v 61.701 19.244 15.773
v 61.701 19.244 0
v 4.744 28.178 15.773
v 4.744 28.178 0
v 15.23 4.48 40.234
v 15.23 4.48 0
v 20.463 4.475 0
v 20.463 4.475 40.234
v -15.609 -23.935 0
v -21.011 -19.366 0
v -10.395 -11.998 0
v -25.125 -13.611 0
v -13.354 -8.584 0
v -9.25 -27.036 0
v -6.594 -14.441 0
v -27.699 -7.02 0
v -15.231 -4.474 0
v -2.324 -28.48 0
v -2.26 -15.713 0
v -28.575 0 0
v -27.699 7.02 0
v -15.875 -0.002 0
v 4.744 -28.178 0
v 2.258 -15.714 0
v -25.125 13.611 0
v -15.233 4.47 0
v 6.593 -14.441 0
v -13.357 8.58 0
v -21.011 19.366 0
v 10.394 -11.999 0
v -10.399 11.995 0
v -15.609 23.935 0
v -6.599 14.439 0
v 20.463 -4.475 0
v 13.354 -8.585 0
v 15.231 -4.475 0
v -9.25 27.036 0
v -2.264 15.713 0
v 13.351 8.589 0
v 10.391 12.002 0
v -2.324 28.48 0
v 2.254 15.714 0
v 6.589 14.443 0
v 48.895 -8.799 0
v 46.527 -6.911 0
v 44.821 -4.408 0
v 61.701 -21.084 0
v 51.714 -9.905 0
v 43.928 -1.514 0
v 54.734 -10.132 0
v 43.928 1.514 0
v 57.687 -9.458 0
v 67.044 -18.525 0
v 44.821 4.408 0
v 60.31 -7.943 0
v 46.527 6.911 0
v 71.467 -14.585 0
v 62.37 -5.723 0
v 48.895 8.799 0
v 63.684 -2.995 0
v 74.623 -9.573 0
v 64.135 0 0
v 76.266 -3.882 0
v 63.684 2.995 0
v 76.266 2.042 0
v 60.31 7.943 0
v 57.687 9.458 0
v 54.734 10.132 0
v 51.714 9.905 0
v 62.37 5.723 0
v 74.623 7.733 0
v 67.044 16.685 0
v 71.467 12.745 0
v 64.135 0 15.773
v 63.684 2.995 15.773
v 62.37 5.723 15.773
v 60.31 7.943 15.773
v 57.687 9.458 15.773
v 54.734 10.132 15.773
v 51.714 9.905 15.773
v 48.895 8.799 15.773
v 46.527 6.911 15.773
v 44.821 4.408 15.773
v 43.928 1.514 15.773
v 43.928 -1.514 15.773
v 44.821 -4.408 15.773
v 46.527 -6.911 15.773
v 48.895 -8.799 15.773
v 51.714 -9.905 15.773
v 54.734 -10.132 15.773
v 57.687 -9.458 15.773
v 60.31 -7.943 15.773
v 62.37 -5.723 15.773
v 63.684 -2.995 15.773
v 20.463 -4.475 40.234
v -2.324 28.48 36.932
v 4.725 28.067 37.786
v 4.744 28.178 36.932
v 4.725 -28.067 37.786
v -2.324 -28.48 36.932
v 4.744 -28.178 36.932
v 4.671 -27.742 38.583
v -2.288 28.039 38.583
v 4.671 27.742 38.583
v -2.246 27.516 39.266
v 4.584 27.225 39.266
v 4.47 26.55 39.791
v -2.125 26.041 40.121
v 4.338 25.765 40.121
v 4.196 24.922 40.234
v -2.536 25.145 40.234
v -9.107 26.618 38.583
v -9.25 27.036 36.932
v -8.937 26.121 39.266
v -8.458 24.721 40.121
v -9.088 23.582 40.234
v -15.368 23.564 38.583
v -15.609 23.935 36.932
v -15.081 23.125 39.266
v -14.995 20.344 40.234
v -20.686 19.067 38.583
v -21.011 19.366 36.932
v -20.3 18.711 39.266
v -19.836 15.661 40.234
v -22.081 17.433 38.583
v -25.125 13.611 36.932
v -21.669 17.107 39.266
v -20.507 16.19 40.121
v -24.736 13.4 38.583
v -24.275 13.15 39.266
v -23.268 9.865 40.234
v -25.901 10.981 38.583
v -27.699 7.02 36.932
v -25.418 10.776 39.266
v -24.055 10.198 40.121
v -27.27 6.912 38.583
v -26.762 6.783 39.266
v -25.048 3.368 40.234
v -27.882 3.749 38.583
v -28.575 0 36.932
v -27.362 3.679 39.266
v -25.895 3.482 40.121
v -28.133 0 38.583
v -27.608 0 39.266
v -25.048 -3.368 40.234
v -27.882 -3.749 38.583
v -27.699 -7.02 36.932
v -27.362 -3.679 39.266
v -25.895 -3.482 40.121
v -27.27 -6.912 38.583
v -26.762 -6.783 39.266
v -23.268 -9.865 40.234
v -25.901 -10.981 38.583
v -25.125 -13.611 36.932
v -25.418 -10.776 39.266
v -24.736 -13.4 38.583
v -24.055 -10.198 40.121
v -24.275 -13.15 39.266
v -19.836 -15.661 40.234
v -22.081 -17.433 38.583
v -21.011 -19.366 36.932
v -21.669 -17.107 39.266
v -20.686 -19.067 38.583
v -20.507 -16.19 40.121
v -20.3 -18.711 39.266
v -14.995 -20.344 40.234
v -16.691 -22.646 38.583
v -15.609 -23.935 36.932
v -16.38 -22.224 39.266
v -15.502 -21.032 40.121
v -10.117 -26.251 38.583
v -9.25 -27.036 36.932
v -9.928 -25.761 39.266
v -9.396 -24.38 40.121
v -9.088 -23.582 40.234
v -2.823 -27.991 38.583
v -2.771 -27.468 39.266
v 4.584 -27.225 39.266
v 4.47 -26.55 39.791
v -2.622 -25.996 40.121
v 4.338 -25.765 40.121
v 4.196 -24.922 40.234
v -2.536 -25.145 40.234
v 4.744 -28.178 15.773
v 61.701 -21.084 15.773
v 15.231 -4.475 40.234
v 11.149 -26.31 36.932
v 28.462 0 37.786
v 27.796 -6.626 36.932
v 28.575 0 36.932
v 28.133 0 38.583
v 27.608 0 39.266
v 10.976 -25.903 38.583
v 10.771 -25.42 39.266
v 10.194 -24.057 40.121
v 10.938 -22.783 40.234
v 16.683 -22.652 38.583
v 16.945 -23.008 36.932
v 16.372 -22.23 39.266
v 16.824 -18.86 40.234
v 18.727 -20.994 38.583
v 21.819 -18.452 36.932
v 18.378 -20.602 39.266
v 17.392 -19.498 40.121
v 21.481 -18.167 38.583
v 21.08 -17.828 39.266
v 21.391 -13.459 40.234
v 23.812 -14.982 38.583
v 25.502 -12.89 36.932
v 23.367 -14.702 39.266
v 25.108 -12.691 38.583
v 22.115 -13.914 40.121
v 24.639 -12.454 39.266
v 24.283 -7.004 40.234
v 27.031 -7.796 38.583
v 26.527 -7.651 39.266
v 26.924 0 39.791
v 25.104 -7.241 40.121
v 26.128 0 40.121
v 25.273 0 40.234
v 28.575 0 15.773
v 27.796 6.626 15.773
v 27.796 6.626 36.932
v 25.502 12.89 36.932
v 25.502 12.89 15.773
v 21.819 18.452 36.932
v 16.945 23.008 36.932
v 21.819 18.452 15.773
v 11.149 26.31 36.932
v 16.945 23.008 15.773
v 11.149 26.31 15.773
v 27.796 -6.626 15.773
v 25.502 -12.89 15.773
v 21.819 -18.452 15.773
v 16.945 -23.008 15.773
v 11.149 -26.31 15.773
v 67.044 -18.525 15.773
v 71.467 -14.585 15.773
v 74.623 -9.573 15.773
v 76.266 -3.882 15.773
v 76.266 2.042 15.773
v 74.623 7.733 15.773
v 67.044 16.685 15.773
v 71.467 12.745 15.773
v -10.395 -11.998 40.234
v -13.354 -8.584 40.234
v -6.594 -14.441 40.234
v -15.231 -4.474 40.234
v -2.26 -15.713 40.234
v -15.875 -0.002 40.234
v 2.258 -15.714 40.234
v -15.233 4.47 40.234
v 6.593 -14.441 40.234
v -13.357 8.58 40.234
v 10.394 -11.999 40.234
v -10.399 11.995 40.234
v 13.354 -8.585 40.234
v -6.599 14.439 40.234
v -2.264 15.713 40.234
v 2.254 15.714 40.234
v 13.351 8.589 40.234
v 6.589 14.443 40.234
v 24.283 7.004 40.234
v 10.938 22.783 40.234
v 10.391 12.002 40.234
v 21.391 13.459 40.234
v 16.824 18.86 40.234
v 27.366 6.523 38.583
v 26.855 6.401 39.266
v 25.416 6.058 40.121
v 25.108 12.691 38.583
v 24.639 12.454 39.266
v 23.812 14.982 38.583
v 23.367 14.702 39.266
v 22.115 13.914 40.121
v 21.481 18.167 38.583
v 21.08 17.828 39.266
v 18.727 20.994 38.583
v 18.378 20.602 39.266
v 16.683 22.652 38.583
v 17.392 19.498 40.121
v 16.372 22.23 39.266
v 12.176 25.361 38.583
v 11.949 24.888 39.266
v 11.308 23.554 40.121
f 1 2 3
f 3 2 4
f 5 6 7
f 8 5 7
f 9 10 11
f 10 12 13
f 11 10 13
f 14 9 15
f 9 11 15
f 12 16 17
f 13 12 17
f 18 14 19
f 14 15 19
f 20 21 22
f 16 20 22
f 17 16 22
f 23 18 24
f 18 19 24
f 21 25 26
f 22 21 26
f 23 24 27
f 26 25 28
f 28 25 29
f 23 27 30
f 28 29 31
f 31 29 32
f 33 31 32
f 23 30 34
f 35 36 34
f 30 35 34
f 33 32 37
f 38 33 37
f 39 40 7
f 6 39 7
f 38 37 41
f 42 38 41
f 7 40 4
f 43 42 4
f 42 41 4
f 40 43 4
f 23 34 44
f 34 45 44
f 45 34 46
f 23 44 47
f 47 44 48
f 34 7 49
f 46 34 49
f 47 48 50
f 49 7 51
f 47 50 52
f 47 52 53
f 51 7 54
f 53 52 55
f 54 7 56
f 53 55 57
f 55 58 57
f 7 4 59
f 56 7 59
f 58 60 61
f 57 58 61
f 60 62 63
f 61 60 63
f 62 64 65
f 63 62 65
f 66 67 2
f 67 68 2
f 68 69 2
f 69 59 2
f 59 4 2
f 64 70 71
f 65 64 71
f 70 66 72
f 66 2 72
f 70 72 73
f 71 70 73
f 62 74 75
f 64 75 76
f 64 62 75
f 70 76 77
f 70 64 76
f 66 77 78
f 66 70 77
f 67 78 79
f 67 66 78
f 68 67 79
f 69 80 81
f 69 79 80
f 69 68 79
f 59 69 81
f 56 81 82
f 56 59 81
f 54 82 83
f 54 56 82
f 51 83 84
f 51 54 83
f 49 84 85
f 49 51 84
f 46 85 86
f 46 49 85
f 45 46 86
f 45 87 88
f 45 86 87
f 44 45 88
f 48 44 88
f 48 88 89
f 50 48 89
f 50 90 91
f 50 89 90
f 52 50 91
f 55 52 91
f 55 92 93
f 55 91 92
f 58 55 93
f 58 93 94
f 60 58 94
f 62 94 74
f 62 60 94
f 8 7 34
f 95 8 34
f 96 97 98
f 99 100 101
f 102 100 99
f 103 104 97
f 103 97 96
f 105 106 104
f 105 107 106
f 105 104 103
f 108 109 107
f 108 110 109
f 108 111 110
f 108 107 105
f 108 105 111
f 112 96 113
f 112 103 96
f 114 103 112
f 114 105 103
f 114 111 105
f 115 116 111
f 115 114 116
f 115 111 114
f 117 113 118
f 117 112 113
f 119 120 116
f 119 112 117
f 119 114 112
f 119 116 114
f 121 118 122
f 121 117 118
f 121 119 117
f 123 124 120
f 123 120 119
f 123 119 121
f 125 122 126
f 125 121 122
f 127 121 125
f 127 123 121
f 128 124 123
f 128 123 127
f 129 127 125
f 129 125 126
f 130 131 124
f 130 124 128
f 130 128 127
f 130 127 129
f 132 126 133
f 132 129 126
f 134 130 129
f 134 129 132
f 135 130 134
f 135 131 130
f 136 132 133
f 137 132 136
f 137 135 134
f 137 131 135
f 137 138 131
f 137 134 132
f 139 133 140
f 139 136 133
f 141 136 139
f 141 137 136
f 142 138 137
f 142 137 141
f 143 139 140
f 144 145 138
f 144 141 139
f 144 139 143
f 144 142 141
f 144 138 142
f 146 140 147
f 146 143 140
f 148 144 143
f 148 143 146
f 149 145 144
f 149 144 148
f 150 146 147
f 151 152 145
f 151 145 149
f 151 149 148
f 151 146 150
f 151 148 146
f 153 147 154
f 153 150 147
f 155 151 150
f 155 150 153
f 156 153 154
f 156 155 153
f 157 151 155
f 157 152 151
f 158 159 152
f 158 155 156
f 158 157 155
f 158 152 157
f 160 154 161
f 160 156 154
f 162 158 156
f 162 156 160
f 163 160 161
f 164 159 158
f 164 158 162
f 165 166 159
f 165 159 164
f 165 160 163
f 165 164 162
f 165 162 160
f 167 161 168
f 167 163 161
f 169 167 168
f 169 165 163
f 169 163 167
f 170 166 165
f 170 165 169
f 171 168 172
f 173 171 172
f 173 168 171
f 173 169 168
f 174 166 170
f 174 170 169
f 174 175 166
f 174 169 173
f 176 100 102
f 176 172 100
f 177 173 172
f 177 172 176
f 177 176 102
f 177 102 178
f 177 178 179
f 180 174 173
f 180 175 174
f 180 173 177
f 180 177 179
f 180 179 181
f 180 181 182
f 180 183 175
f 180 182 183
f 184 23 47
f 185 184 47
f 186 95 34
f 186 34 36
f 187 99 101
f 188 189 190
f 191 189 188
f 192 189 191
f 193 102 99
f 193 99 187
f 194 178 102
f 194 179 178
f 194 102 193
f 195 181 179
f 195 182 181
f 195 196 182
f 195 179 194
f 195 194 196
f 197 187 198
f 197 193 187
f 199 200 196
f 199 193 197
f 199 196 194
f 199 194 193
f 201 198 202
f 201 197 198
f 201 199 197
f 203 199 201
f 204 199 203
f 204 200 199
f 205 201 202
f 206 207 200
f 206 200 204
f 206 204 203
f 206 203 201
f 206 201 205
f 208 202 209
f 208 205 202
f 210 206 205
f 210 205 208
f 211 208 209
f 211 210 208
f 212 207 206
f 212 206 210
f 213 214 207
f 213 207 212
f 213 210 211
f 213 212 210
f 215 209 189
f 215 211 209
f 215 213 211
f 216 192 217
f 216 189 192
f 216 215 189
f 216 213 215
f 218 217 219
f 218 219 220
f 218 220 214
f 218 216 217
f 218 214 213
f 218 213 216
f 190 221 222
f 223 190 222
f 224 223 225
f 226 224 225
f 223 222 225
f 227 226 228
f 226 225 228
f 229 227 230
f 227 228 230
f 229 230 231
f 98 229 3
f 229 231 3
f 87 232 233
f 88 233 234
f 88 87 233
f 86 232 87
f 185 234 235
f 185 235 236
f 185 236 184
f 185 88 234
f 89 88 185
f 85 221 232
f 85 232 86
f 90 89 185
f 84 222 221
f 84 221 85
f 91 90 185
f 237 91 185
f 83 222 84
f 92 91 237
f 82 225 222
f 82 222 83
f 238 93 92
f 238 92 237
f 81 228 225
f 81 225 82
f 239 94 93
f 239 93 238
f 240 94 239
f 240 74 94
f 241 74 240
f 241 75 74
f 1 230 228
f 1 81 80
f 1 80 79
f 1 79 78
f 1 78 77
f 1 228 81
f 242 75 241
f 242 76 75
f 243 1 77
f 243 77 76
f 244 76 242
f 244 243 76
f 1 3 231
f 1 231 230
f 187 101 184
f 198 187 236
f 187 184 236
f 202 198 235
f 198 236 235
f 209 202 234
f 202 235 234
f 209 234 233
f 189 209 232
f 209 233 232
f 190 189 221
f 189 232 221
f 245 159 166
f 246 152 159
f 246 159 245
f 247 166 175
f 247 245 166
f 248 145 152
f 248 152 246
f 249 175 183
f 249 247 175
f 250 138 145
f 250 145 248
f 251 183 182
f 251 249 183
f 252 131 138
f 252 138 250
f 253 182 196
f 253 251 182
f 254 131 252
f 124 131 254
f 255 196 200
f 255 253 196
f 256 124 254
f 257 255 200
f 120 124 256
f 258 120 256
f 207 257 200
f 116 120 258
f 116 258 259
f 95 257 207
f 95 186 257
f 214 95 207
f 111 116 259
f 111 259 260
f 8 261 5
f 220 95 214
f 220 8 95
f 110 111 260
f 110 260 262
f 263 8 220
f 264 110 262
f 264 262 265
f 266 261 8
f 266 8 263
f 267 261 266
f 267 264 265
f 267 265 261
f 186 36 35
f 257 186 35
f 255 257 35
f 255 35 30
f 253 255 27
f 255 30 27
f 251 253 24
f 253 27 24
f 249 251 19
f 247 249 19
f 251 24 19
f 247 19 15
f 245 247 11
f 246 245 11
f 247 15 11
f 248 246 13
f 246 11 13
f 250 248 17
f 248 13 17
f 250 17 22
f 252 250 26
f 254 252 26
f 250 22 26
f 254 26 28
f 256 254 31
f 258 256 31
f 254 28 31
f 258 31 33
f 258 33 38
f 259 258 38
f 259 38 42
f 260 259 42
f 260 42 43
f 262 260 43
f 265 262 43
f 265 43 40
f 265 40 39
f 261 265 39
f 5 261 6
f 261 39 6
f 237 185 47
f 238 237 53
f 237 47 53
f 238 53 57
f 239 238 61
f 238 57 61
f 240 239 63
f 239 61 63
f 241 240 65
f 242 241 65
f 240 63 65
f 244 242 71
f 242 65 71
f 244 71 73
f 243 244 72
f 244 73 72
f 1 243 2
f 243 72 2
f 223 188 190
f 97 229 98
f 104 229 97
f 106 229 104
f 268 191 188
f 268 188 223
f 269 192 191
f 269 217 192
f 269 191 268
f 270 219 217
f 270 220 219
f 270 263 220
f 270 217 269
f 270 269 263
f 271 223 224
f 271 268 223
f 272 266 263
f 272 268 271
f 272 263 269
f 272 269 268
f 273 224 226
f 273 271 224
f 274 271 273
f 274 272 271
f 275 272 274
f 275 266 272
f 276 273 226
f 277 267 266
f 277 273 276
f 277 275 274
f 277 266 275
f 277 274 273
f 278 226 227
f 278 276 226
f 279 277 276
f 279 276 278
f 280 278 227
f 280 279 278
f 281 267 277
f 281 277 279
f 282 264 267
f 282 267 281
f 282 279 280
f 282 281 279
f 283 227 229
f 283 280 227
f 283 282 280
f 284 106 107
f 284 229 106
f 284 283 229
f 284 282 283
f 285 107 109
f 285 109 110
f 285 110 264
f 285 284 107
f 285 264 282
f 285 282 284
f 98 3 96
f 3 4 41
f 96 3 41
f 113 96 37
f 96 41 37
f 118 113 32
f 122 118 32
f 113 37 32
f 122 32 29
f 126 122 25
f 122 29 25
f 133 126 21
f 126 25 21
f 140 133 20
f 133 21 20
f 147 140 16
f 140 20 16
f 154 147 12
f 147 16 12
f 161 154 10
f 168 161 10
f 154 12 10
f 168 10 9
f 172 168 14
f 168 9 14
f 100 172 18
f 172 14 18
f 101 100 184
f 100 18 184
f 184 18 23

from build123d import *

# Parameters (mm, degrees)
F2_DEPTH = 40.2336
F3_DEPTH = 15.7734
F4_R     = 3.302
F1_R     = 10.16
F5_DEPTH = 40.64


with BuildPart() as f2:
    # F0 (on Top) → F2 (new body)
    with BuildSketch(Plane.XY):
        with BuildLine():
            ThreePointArc((4.744137, -28.178428), (21.818505, -18.452194), (28.575, 0))
            ThreePointArc((28.575, 0), (21.818505, 18.452194), (4.744137, 28.178428))
            ThreePointArc((4.744137, 28.178428), (-28.575, 0), (4.744137, -28.178428))
        make_face()
        with BuildLine():
            ThreePointArc((15.231124, -4.475321), (-15.875, -0.002348), (15.229799, 4.479826))
            Line((15.229799, 4.479826), (20.463184, 4.475321))
            Line((20.463184, 4.475321), (20.463184, -4.475321))
            Line((20.463184, -4.475321), (15.231124, -4.475321))
        make_face(mode=Mode.SUBTRACT)
    extrude(amount=F2_DEPTH)

    # F0 (on Top) → F3 (join)
    with BuildSketch(Plane.XY):
        with BuildLine():
            ThreePointArc((4.744137, 28.178428), (21.818505, 18.452194), (28.575, 0))
            ThreePointArc((28.575, 0), (21.818505, -18.452194), (4.744137, -28.178428))
            Line((4.744137, -28.178428), (61.701294, -21.083742))
            ThreePointArc((61.701294, -21.083742), (76.474609, -0.919848), (61.701294, 19.244047))
            Line((61.701294, 19.244047), (4.744137, 28.178428))
        make_face()
    extrude(amount=F3_DEPTH)

    # F4
    f4_edges = [f2.edges().sort_by_distance(p)[0] for p in [
        (-4.744137, 28.178428, 40.2336),
    ]]
    fillet(f4_edges, radius=F4_R)

    # F1 (on Top) → F5 (cut)
    with BuildSketch(Plane.XY):
        with Locations((53.975, 0)):
            Circle(F1_R)
    extrude(amount=F5_DEPTH, mode=Mode.SUBTRACT)


solid = f2.part
